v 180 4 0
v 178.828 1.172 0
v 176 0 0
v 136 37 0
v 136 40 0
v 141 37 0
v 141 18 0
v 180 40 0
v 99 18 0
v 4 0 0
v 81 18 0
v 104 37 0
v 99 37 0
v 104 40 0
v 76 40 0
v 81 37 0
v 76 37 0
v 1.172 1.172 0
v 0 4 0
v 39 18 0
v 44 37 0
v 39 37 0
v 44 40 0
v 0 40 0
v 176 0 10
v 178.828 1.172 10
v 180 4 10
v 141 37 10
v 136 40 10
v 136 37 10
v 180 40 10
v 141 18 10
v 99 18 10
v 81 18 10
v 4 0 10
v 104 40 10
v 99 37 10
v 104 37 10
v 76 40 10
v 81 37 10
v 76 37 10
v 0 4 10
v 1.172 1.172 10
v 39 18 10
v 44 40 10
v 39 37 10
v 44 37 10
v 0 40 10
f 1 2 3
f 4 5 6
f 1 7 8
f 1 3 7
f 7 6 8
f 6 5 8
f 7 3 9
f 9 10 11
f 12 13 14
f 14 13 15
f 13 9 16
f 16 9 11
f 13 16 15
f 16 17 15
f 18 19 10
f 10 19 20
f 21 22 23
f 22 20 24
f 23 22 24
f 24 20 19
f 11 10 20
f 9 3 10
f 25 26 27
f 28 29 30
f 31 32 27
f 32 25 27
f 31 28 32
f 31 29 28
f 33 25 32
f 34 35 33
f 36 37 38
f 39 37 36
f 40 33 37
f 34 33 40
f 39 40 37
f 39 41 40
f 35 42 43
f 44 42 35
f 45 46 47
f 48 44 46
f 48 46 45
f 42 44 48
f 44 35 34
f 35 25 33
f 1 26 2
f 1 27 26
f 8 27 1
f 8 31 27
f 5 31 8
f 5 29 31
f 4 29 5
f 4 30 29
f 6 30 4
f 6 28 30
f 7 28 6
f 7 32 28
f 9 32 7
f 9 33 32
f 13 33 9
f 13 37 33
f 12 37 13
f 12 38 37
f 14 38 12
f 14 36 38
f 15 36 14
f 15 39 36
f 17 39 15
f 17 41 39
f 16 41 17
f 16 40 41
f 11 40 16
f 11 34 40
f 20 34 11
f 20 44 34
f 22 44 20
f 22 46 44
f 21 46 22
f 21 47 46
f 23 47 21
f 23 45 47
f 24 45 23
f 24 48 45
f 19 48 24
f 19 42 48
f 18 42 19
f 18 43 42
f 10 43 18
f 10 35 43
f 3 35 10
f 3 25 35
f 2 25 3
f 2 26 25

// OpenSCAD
$fn = 32;

// ----------------------------------------------------------------------
// Oversize slot bar: 180 mm bar with 2 oversize windows
// ----------------------------------------------------------------------

// --- parameters (mm) ---
profile_height = 10;      // extrusion height
profile_points = 24;      // points of the closed outline

profile = [[0, 4], [1.172, 1.172], [4, 0], [176, 0], [178.828, 1.172], [180, 4], [180, 40], [136, 40], [136, 37], [141, 37], [141, 18], [99, 18], [99, 37], [104, 37], [104, 40], [76, 40], [76, 37], [81, 37], [81, 18], [39, 18], [39, 37], [44, 37], [44, 40], [0, 40]];  // single closed polygon, 24 points, counter clockwise

// --- the one profile operation ---
linear_extrude(height = profile_height) polygon(points = profile);
